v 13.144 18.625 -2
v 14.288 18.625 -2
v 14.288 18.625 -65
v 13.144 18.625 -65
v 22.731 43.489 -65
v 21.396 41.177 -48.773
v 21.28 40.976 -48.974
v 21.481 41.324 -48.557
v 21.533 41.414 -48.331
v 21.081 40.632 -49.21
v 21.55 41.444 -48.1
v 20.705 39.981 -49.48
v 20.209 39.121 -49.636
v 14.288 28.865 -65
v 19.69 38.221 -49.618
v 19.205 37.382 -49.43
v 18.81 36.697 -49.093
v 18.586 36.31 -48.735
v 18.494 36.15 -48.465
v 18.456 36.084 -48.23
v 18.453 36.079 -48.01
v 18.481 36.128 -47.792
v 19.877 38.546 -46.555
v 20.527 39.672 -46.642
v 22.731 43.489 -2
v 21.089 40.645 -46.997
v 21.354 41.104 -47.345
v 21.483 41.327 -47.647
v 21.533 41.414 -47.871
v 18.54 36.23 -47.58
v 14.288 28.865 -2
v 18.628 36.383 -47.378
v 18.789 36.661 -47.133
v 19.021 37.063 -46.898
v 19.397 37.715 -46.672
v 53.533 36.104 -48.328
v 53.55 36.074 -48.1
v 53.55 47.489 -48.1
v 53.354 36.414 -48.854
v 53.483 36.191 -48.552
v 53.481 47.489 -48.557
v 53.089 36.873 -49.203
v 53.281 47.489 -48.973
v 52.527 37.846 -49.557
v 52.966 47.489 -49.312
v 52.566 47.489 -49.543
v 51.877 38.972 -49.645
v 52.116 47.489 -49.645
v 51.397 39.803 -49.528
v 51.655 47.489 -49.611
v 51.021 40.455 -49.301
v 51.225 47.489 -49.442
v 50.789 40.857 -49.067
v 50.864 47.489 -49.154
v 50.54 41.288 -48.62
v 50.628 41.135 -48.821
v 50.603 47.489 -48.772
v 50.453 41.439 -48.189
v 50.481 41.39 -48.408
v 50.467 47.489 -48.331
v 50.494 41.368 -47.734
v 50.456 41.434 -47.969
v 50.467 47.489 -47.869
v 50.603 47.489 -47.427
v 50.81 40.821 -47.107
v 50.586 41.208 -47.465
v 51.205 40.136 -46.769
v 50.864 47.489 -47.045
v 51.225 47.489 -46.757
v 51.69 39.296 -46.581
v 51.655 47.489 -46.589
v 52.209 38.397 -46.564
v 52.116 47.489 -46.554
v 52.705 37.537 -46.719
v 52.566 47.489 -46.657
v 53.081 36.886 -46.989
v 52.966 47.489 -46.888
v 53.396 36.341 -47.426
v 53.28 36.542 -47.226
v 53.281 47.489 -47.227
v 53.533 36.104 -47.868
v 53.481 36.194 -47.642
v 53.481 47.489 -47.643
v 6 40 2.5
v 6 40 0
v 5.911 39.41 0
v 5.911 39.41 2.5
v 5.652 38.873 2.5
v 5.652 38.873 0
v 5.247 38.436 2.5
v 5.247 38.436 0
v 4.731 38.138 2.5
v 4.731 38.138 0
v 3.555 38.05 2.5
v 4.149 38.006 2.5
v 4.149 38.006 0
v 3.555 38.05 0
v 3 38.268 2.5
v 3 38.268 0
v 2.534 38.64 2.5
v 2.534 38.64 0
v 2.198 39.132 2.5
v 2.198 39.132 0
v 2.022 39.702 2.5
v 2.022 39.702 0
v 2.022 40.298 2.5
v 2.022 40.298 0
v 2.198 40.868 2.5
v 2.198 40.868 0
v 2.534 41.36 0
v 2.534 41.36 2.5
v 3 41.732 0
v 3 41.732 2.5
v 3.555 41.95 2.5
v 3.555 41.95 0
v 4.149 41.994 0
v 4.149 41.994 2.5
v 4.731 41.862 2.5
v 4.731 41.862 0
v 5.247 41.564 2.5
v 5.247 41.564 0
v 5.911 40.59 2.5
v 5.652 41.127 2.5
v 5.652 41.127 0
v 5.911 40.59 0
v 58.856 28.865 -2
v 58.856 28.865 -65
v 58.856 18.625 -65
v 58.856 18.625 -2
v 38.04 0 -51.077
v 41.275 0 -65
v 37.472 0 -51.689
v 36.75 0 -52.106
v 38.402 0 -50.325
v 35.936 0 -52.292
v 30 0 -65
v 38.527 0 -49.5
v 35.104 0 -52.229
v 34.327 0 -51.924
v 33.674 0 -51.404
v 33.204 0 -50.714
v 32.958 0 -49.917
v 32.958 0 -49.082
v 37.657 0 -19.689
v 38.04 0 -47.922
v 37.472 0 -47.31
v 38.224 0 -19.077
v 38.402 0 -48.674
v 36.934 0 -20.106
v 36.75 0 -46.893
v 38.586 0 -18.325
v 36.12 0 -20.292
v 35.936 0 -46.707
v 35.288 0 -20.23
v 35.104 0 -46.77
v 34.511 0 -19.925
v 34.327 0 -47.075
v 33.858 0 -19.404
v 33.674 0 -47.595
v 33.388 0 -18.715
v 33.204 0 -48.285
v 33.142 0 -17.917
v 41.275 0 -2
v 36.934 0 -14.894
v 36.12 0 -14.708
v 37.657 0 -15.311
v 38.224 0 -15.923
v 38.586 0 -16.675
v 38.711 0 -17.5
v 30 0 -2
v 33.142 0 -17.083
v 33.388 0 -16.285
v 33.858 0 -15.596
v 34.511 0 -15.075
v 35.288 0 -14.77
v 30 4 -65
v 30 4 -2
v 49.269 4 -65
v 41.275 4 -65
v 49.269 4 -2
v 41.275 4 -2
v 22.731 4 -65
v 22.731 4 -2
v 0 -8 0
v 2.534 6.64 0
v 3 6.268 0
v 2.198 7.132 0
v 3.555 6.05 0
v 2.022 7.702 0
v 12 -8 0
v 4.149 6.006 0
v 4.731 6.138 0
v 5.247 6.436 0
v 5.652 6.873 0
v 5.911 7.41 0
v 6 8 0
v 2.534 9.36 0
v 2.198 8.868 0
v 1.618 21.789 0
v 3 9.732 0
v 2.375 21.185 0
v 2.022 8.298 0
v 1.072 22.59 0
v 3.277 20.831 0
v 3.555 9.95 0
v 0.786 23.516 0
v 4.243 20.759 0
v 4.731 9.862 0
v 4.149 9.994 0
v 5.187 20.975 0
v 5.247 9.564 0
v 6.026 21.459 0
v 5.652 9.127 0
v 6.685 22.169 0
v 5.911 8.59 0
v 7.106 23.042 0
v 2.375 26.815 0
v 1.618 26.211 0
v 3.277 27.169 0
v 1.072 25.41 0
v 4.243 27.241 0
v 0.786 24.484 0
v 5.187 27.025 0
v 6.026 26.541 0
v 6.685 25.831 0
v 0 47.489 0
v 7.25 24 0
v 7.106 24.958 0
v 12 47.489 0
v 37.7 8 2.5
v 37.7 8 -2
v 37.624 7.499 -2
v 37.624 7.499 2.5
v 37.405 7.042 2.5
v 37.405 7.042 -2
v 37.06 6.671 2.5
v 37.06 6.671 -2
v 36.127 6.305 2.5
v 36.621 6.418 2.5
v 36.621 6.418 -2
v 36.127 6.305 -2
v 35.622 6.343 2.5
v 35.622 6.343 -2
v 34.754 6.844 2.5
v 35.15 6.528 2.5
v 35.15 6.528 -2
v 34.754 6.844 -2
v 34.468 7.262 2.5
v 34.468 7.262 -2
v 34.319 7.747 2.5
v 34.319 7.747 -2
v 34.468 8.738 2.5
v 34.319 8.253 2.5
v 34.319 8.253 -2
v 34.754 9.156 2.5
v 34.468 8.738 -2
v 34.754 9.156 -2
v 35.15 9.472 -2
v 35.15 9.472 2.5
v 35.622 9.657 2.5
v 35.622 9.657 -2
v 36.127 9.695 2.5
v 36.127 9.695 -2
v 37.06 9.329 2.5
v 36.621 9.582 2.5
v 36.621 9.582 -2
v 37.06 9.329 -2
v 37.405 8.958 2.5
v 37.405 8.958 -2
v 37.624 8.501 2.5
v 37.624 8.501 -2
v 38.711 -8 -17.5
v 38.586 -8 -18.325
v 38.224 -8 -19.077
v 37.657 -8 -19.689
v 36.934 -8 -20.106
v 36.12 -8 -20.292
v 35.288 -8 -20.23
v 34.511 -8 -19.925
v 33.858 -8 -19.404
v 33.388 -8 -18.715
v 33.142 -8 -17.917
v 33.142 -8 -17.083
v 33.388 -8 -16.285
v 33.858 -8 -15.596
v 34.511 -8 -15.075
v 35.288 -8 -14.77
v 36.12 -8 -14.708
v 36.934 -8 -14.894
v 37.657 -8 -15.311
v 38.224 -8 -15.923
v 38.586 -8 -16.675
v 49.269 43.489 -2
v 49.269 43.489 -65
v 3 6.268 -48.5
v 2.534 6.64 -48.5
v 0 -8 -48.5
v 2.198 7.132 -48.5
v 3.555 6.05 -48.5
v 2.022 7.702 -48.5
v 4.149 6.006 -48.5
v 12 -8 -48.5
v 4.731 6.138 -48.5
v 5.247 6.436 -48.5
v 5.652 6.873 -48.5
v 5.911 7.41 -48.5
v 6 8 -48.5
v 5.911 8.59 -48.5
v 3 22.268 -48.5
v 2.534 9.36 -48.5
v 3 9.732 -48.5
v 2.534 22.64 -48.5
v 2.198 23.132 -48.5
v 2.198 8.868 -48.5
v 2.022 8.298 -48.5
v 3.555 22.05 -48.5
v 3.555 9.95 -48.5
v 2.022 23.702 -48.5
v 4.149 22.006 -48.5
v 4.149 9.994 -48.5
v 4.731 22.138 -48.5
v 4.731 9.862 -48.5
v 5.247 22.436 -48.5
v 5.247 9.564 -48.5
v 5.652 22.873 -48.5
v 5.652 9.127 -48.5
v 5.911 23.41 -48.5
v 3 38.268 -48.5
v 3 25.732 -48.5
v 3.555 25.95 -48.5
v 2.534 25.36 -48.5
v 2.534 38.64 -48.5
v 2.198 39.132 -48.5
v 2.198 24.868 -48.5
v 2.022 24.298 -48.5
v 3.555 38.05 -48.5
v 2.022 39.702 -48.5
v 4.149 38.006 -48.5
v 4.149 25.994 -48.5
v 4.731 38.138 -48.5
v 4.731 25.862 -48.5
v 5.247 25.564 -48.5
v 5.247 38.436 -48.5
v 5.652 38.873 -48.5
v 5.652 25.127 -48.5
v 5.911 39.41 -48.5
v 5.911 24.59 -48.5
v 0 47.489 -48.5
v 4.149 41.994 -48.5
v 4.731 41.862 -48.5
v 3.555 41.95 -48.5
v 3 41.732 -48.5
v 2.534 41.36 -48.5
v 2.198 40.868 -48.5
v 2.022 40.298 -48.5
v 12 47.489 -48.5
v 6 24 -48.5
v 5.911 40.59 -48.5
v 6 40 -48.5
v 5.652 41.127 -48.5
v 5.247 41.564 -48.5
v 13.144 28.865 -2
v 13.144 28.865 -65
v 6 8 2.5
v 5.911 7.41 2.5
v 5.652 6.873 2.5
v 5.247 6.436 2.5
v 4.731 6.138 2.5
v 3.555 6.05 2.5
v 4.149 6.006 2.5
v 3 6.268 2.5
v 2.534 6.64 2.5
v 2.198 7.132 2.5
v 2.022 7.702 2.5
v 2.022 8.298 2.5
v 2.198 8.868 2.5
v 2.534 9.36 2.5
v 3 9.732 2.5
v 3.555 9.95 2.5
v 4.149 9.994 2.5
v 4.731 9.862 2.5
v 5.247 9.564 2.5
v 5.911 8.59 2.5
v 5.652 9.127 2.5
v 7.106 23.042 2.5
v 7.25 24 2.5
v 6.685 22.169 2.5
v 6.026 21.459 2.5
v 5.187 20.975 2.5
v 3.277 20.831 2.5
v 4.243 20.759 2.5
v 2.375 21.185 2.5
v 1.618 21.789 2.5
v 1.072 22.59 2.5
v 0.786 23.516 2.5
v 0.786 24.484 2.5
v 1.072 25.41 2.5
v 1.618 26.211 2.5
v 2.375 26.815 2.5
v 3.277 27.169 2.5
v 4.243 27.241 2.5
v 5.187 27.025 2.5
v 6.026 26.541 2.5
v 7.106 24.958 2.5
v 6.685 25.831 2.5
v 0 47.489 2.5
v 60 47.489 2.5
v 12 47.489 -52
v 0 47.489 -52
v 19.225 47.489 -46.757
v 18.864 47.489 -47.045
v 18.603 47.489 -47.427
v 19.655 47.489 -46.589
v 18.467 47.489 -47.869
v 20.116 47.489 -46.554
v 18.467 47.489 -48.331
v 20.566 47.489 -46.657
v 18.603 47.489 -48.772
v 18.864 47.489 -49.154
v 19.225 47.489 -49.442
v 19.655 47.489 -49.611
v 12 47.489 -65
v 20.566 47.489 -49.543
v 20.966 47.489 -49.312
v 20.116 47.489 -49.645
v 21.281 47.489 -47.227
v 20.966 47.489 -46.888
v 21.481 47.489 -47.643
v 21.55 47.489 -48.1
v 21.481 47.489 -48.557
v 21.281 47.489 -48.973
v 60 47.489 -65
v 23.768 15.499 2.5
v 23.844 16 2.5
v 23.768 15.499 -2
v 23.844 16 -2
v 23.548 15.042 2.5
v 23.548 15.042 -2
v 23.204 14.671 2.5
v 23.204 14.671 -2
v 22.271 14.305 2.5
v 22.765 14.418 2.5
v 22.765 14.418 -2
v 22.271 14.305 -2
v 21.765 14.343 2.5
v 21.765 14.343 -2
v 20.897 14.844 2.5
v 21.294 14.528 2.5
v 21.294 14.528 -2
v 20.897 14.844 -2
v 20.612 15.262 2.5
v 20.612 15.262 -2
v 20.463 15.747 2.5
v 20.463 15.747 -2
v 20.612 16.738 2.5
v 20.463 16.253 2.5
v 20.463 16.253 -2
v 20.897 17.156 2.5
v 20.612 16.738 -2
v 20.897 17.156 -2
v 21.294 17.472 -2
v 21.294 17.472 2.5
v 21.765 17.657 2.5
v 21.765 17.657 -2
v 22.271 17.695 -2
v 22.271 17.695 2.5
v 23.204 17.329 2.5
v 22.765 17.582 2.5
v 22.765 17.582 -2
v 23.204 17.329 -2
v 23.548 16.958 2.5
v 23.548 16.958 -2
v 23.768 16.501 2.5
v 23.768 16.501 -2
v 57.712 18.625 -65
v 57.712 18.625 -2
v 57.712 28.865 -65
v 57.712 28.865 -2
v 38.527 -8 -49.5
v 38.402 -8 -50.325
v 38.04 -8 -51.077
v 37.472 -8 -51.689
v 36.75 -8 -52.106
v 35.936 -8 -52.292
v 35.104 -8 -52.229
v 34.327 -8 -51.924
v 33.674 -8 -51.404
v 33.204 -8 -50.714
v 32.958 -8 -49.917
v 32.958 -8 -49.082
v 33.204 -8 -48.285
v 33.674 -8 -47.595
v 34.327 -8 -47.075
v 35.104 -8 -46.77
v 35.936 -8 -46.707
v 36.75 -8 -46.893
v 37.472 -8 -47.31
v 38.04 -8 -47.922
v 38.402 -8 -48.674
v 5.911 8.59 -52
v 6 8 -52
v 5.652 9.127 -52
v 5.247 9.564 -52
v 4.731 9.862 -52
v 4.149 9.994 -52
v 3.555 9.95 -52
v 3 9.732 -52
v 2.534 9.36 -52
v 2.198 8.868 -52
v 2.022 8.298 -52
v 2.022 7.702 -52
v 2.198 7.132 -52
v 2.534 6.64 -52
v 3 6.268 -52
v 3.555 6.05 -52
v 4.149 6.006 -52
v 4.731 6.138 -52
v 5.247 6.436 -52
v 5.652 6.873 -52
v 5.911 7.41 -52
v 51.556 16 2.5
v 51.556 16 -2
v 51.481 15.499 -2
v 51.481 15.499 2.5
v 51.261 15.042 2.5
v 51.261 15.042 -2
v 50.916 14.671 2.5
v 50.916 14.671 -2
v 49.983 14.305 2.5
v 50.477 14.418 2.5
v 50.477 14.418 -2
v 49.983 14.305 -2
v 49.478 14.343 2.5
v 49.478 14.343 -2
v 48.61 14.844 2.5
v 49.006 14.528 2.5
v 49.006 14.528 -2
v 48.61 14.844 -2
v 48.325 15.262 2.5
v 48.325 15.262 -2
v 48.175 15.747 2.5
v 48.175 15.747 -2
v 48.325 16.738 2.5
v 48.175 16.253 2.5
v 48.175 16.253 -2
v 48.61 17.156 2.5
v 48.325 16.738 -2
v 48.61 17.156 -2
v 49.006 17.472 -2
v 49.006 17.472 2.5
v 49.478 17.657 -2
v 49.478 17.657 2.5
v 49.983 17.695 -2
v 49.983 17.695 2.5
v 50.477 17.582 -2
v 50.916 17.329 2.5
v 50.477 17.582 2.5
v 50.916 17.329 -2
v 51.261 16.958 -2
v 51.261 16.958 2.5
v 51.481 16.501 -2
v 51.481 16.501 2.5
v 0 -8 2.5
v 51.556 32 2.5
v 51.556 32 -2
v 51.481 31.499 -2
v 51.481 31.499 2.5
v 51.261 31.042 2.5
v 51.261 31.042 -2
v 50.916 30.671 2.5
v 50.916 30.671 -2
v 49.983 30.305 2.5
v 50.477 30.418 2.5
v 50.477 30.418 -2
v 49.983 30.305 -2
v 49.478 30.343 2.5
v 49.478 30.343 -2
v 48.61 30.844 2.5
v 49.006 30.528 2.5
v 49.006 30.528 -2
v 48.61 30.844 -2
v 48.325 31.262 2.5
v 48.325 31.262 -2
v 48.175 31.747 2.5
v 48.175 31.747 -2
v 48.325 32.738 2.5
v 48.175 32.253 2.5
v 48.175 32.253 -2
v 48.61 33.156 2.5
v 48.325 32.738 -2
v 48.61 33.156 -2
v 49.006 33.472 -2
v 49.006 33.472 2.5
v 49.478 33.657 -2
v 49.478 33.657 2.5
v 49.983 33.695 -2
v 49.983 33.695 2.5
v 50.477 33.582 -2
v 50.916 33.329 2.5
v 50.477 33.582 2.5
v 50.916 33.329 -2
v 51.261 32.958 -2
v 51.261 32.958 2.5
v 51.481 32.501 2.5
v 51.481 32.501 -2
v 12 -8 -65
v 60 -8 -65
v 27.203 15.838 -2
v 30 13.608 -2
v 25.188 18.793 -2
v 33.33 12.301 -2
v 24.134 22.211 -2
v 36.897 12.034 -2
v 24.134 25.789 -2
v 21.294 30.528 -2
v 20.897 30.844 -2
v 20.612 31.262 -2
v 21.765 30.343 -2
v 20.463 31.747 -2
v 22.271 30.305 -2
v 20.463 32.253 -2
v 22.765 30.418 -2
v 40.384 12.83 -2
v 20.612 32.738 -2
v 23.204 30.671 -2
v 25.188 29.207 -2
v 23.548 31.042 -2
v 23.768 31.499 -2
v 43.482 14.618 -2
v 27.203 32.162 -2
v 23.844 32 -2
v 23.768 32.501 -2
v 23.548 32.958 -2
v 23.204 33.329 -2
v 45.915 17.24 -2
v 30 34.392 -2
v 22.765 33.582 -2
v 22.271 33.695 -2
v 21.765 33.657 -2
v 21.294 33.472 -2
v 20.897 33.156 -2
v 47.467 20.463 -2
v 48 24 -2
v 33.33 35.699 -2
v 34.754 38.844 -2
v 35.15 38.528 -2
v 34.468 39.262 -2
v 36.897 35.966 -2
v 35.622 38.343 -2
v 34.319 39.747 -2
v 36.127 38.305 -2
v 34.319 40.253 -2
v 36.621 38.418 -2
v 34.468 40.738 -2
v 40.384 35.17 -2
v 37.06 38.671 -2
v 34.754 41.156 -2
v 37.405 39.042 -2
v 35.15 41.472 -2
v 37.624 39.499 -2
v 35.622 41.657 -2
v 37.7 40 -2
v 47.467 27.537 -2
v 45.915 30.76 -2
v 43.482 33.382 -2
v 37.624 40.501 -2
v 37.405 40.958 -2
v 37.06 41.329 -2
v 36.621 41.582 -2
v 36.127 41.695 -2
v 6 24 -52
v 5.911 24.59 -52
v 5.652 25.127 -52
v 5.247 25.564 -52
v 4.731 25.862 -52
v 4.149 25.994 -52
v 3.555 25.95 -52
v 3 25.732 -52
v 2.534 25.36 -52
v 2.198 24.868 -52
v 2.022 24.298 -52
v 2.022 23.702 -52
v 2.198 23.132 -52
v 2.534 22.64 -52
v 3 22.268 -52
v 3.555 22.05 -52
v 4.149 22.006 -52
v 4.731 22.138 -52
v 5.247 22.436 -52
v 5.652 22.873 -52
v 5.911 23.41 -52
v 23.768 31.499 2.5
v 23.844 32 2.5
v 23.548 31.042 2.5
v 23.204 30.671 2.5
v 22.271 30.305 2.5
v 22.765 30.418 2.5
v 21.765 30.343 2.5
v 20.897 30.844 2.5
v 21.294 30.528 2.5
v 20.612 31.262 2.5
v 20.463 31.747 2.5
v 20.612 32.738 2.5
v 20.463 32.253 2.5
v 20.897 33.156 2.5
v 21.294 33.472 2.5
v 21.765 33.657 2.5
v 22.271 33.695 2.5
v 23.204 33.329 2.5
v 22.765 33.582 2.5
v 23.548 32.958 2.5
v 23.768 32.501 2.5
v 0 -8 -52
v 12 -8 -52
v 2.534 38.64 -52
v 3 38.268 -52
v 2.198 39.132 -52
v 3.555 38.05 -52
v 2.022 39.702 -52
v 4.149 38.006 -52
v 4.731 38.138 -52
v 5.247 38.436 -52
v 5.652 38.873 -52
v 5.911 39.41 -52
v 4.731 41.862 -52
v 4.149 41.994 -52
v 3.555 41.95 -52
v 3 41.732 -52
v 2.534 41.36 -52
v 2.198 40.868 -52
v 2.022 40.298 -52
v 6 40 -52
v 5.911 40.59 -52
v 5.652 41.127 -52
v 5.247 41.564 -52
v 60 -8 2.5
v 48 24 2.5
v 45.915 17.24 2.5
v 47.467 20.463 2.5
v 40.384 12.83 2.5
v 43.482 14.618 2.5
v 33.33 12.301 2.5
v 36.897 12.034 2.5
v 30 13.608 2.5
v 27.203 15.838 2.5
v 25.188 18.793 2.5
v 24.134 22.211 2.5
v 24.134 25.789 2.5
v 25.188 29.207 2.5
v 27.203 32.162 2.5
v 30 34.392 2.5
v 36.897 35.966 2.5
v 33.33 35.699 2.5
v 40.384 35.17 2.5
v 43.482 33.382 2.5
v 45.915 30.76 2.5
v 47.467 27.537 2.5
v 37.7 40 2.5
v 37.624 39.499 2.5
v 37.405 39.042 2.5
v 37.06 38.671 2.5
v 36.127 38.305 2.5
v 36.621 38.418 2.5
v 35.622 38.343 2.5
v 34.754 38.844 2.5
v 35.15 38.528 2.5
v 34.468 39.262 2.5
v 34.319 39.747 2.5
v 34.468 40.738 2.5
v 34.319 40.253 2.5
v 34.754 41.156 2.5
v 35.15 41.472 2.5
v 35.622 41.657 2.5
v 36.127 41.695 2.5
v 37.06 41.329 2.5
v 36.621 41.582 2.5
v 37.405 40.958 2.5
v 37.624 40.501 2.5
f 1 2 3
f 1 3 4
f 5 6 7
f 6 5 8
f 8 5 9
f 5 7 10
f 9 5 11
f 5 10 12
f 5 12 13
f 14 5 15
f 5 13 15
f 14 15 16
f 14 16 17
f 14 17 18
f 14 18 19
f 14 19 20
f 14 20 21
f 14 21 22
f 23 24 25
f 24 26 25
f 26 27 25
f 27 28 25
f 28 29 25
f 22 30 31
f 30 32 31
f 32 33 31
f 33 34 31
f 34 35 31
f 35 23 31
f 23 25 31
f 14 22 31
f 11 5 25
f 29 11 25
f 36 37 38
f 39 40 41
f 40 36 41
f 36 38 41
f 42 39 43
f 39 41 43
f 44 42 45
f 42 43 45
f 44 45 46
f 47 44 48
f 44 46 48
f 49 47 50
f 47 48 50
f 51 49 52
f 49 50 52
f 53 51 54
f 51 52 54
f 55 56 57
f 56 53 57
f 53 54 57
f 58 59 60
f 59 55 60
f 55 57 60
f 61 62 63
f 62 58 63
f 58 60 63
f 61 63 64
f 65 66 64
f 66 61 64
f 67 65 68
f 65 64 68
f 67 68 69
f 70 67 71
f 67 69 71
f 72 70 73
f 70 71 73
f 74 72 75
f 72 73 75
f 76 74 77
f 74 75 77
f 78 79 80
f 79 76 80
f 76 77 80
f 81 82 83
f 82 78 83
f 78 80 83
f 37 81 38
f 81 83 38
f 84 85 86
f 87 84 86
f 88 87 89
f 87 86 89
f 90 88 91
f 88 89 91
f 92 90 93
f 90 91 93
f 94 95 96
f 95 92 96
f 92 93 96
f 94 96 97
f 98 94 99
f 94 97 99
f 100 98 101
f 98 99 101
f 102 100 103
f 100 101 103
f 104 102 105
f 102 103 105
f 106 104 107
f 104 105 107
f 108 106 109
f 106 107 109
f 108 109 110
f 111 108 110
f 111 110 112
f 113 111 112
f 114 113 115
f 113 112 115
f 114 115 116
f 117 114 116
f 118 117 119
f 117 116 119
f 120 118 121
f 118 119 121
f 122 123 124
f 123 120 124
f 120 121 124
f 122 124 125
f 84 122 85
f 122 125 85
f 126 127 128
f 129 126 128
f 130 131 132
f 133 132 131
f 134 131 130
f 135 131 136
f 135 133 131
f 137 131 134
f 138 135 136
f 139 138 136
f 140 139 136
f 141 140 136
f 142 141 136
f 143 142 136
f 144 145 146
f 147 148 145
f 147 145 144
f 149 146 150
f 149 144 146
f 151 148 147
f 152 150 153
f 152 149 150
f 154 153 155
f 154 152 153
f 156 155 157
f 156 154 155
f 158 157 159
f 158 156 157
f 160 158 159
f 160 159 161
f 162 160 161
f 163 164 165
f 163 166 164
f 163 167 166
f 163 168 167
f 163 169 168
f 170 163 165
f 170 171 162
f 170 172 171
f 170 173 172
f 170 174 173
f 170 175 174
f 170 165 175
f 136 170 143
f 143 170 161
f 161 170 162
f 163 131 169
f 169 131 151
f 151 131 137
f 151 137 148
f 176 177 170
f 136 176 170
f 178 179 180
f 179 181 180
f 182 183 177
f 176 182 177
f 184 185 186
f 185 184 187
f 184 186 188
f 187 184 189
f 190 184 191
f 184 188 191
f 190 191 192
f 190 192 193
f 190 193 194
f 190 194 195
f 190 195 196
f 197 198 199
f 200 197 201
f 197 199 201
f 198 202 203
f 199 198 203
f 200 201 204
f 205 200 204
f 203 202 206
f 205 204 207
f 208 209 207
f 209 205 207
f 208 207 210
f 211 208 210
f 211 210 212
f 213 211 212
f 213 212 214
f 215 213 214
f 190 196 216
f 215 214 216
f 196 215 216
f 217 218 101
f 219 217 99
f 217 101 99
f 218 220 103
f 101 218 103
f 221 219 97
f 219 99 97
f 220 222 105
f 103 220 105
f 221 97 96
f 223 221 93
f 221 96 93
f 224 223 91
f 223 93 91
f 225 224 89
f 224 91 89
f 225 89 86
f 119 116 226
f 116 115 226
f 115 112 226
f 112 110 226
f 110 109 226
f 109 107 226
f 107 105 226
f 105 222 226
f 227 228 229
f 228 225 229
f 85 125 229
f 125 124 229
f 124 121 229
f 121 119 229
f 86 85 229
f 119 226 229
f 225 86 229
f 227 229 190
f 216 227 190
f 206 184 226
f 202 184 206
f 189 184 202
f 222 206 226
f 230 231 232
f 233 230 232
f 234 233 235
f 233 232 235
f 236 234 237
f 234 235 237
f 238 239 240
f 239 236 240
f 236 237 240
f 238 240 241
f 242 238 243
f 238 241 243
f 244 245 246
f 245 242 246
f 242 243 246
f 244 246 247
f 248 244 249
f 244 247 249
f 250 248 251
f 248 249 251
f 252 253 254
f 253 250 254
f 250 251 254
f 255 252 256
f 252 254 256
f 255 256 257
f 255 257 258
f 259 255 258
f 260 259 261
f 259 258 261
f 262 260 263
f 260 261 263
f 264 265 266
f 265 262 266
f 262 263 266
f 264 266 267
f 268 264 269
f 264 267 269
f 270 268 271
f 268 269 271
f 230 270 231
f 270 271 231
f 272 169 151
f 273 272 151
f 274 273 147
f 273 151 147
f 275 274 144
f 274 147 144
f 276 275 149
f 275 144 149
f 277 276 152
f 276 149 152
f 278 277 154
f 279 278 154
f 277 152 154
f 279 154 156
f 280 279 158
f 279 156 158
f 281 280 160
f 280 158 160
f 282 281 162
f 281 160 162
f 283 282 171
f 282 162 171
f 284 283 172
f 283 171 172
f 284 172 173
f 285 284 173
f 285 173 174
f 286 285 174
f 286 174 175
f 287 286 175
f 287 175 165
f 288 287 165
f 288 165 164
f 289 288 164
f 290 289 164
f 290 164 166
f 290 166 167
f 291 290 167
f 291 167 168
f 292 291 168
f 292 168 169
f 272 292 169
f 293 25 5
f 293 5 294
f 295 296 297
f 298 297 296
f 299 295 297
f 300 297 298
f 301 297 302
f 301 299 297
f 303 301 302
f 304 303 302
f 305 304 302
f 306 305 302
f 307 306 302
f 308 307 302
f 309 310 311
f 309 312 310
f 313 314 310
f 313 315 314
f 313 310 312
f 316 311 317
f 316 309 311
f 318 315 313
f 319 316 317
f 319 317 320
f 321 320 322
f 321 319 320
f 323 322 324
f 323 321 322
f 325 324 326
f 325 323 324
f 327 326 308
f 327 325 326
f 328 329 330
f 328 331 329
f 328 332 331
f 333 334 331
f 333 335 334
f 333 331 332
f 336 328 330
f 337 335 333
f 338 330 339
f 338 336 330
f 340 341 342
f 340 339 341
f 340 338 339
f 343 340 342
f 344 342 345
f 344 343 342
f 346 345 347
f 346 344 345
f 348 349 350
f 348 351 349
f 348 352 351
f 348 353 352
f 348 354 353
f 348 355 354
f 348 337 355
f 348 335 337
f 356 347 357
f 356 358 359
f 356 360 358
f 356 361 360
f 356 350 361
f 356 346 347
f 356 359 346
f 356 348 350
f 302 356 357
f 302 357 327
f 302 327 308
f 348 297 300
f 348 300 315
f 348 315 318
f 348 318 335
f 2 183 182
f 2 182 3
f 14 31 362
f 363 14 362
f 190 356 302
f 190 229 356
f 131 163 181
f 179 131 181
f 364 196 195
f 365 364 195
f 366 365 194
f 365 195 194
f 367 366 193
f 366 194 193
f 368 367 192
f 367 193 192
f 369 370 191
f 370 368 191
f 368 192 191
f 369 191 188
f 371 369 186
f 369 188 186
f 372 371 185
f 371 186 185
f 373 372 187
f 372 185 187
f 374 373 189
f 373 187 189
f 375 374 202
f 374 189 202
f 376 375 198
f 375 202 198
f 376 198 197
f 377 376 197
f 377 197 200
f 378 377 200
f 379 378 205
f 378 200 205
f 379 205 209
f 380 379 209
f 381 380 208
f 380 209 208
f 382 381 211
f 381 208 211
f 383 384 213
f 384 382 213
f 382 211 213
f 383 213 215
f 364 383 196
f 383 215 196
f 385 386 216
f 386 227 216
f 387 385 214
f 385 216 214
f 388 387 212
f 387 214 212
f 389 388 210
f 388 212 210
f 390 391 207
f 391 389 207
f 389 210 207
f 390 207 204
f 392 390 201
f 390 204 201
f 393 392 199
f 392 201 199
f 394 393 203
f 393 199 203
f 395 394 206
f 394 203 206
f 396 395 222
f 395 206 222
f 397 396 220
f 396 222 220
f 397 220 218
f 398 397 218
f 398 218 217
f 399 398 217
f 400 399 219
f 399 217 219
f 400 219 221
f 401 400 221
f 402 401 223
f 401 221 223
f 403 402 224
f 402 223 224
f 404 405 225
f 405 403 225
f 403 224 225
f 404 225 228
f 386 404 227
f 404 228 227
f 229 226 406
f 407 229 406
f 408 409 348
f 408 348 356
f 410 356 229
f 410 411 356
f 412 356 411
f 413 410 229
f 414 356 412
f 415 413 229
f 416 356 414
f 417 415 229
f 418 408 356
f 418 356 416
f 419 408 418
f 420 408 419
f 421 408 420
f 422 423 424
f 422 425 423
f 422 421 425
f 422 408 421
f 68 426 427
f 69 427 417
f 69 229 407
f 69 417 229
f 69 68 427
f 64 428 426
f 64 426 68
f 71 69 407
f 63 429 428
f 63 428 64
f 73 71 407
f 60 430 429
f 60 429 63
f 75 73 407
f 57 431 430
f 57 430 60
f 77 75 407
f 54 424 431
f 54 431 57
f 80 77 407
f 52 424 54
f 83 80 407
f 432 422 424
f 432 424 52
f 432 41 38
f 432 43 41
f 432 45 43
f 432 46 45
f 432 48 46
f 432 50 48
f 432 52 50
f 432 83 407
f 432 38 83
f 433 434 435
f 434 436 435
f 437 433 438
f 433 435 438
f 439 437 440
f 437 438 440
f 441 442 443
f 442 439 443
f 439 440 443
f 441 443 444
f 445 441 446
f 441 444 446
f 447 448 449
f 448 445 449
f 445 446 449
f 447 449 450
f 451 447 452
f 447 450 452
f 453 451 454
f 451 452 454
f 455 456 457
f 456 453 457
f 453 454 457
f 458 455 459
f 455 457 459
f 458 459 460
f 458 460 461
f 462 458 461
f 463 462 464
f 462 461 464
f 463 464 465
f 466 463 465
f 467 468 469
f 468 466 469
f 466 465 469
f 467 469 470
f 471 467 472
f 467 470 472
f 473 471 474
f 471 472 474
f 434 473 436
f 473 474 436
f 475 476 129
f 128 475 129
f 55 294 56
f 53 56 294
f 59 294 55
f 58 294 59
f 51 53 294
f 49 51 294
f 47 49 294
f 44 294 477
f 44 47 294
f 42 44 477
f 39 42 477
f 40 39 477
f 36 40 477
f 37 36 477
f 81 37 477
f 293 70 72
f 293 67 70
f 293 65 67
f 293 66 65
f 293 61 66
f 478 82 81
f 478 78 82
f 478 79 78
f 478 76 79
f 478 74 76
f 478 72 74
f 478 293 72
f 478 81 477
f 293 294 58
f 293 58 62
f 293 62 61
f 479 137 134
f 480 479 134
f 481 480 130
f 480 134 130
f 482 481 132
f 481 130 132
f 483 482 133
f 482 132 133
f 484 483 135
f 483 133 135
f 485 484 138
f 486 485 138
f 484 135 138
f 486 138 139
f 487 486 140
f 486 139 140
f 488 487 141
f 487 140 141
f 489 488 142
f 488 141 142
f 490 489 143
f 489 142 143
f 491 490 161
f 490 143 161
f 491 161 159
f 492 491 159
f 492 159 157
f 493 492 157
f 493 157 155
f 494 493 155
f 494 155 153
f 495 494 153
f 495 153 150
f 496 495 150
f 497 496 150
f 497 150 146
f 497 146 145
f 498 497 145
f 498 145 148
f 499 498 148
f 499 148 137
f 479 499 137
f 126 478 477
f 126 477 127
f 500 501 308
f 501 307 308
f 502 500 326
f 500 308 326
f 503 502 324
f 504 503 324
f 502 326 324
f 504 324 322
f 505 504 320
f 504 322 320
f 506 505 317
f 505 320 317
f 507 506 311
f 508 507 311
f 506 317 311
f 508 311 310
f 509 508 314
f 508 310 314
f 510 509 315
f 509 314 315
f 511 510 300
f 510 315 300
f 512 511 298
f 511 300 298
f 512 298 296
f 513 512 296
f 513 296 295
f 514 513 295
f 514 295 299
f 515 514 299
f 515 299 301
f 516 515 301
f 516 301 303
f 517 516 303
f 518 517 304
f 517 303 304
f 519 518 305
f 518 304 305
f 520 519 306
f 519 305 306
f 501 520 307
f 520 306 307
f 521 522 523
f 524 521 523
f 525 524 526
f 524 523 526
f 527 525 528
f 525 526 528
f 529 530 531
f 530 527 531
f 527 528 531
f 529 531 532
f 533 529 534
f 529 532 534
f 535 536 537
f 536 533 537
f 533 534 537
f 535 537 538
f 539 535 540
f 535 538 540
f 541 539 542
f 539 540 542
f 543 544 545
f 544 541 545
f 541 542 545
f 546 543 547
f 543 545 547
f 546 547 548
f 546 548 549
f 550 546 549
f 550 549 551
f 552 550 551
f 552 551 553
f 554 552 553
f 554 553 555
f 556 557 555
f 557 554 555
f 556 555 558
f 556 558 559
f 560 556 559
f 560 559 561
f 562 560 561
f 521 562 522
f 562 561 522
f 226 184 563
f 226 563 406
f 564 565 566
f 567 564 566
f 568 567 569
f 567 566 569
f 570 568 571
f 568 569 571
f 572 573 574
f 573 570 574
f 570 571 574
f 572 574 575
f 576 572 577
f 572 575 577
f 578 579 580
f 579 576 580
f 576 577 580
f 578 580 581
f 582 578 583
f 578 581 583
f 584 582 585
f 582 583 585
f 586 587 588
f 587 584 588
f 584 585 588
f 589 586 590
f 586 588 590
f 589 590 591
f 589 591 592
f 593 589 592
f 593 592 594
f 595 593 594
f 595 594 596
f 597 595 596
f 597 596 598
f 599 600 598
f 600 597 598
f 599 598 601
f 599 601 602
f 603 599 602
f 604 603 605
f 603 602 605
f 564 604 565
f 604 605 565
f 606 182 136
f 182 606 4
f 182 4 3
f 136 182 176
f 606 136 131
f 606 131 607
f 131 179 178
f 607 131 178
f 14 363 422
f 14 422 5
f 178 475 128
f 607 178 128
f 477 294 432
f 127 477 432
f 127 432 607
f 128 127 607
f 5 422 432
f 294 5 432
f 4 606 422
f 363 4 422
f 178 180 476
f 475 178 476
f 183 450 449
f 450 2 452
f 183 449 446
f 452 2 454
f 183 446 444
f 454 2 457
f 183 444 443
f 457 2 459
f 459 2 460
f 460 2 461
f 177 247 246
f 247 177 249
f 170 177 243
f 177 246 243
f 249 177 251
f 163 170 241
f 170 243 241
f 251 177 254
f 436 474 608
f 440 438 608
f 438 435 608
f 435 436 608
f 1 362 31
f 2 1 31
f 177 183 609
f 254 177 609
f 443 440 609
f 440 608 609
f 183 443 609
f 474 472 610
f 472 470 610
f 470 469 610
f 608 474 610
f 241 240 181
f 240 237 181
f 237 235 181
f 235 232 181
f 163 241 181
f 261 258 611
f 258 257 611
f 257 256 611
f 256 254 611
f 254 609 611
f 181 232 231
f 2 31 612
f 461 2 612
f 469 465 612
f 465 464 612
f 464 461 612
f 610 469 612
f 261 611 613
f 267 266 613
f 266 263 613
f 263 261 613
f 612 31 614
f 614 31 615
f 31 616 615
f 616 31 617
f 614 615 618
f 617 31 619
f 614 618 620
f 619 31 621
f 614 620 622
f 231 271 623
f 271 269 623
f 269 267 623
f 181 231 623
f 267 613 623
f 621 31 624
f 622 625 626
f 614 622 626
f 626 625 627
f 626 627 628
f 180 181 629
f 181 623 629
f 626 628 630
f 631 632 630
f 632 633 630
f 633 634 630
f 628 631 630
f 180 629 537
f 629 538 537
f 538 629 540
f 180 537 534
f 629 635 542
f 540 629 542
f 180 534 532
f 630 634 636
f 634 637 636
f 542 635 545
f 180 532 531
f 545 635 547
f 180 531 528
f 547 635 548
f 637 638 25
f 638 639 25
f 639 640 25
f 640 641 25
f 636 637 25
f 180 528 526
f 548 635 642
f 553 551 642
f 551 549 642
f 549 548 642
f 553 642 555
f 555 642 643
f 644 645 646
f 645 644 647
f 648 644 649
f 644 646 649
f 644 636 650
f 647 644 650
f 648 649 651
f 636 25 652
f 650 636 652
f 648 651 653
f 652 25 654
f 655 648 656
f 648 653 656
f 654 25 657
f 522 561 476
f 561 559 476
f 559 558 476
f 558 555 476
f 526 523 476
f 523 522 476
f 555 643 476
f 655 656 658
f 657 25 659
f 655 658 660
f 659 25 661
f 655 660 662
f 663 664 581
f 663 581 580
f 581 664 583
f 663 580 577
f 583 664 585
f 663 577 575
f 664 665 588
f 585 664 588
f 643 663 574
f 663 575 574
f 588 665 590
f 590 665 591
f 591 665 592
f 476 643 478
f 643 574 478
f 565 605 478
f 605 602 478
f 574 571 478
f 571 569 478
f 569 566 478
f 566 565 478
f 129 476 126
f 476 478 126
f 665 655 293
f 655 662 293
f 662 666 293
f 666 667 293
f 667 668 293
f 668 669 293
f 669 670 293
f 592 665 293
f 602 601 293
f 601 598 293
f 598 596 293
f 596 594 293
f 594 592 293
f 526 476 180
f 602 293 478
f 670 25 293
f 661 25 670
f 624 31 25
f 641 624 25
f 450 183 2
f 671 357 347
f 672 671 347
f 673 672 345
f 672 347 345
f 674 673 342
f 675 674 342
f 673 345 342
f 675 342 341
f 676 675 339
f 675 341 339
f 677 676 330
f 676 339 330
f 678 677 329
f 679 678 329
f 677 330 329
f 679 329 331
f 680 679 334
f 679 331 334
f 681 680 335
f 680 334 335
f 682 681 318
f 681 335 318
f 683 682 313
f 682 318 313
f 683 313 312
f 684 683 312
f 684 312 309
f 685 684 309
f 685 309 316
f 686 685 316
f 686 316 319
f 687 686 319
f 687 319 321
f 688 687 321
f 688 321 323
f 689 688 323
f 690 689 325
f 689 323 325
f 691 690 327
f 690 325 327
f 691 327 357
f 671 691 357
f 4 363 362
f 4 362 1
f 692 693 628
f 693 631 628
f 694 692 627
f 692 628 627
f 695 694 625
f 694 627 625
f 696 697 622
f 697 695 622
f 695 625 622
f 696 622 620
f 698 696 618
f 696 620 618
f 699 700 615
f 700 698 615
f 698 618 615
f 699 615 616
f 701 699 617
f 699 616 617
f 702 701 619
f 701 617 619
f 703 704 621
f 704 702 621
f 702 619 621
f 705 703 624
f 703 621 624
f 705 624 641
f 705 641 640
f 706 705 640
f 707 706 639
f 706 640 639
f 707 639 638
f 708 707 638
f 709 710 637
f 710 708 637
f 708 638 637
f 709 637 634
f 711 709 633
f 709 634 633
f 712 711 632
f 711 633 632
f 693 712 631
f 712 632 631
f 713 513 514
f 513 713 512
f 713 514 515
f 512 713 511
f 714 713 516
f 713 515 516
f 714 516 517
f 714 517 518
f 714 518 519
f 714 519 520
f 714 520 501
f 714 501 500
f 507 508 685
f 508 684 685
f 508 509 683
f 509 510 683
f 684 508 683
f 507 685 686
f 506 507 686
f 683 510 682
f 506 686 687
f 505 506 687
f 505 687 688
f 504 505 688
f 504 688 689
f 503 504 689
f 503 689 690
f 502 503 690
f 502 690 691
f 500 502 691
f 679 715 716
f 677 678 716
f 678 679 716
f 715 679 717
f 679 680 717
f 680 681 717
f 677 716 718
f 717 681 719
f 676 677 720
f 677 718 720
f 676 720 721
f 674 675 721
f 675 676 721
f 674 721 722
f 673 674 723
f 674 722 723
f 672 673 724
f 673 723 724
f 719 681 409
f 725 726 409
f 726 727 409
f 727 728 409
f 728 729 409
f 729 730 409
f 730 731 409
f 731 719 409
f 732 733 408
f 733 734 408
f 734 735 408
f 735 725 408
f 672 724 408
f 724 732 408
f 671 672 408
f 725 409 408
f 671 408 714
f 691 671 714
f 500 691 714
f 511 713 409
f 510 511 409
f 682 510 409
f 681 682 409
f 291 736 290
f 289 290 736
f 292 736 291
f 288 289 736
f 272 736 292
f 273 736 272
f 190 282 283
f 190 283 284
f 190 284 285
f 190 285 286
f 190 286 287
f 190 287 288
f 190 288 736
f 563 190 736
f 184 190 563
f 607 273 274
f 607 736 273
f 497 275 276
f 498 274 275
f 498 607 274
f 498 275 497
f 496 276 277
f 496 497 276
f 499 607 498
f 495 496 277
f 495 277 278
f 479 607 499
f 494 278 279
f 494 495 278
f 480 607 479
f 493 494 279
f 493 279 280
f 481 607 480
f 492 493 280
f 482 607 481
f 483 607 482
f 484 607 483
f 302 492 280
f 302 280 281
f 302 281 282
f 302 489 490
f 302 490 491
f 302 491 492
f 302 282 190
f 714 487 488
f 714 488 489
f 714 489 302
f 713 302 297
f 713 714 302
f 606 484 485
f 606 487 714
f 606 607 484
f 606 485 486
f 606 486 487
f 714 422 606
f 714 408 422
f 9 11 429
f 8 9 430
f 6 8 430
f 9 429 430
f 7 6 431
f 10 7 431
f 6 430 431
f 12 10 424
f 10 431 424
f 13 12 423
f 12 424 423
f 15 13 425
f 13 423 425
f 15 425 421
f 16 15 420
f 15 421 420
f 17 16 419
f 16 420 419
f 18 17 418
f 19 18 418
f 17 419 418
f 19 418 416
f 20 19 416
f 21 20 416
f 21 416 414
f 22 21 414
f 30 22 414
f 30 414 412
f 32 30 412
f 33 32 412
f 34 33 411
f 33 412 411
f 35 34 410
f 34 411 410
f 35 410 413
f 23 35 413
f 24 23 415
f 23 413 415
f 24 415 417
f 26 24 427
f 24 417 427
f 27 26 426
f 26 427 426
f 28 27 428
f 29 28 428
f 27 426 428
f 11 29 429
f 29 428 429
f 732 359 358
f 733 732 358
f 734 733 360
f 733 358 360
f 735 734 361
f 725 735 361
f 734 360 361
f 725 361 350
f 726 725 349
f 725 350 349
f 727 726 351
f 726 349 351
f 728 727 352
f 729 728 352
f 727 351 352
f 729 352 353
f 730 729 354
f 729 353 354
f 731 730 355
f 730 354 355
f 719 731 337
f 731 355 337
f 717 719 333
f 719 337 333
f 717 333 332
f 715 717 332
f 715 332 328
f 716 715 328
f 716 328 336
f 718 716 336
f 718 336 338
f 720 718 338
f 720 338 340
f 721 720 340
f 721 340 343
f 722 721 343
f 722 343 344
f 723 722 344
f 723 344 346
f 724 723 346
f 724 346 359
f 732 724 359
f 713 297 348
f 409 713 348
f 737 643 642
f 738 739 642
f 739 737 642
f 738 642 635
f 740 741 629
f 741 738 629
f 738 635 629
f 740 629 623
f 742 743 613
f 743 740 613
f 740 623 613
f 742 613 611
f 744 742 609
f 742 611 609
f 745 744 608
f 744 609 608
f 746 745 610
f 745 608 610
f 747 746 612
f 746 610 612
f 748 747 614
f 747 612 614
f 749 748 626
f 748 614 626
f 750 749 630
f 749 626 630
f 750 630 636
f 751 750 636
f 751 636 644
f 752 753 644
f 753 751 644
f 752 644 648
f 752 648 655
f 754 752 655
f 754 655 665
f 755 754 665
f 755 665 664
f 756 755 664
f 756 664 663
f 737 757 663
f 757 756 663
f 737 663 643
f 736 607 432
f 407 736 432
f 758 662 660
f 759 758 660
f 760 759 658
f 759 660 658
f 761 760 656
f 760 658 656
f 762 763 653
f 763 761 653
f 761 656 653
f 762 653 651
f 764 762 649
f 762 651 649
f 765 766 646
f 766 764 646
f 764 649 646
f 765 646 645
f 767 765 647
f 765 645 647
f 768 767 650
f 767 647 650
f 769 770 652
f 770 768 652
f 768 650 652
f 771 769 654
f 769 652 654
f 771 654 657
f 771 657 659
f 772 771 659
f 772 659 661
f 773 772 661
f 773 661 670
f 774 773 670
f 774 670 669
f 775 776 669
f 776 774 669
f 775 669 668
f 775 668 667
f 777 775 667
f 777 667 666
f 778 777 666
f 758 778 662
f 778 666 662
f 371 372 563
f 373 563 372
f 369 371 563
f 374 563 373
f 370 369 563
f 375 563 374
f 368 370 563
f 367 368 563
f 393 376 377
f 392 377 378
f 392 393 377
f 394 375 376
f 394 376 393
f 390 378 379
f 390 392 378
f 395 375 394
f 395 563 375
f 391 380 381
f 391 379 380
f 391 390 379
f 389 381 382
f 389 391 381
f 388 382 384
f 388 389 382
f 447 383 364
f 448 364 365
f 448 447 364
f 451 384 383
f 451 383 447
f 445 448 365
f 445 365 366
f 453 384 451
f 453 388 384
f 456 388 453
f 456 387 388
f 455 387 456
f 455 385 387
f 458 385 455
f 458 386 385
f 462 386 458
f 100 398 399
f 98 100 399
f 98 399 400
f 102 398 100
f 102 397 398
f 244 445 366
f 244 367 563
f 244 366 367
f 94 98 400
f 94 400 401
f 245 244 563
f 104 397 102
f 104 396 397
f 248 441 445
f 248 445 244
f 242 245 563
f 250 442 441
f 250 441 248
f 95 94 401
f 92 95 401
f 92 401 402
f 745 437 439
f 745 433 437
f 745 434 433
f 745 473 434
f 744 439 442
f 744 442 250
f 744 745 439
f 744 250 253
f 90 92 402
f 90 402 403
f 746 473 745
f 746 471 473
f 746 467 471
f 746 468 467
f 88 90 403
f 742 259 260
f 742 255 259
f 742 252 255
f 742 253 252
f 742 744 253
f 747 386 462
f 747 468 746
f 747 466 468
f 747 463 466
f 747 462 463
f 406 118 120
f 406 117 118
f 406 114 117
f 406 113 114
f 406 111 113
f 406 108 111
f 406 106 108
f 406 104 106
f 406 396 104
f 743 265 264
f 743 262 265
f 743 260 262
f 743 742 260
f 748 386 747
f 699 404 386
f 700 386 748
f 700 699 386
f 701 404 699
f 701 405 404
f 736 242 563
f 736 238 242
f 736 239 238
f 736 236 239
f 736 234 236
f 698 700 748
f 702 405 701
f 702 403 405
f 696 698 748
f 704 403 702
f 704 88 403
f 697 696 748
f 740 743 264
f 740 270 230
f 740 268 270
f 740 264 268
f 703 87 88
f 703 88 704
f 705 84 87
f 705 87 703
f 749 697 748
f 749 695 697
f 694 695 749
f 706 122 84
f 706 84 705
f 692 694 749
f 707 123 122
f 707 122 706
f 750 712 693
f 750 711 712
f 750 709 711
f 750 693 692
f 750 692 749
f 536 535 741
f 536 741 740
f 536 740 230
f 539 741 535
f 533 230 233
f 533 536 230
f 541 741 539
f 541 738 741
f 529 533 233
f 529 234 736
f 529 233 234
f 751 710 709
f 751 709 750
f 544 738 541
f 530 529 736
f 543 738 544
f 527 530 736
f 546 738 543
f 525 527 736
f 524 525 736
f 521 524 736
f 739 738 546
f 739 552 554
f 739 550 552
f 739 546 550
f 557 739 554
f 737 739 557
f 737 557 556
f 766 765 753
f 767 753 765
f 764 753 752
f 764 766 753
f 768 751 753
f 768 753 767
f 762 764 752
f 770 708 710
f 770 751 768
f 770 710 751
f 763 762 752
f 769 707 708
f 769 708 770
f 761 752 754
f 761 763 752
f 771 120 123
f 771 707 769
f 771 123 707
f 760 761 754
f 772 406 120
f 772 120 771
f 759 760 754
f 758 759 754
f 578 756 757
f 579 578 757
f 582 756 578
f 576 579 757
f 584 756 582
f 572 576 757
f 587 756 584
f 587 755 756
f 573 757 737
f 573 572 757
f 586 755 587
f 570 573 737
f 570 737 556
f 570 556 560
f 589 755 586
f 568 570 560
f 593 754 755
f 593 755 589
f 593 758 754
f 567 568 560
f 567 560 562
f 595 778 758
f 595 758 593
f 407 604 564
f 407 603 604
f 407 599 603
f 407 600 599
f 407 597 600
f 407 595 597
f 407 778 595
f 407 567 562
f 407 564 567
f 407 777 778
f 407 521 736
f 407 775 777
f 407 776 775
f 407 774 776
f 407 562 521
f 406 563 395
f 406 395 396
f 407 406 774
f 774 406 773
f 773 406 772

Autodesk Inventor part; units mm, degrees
ref_plane "YZ Plane" through (0, 0, 0) normal (1, 0, 0) x (0, 1, 0)
sketch "Sketch1" plane through (0, 0, 0) normal (0, 0, 1) x (1, 0, 0)
  circle A0 centre (36, 40) radius 1.7
  line L0 (0, 0) -> (12, 0)
  line L1 (0, 0) -> (0, 384)
  line L2 (12, 384) -> (12, -8)
  circle A1 centre (4, 8) radius 2
  circle A2 centre (36, 24) radius 12
  line L3 (0, 0) -> (60, 0)
  line L4 (60, 0) -> (60, 47.4892)
  line L5 (60, 46) -> (0, 46)
  line L6 (0, 46) -> (0, 0)
  line L7 (0, 4) -> (60, 4)
  circle A3 centre (22.1436, 32) radius 1.7
  circle A4 centre (22.1436, 16) radius 1.7
  circle A5 centre (36, 8) radius 1.7
  circle A6 centre (49.8564, 16) radius 1.7
  circle A7 centre (49.8564, 32) radius 1.7
  circle A8 centre (4, 16) radius 2
  circle A9 centre (4, 24) radius 2
  circle A10 centre (4, 32) radius 2
  circle A11 centre (4, 40) radius 2
  line L8 (22.731, 4) -> (14.2875, 18.6246)
  line L9 (14.2875, 18.6246) -> (12, 18.6246)
  line L10 (36, 0) -> (36, 40) construction
  line L11 (49.269, 4) -> (57.7125, 18.6246)
  line L12 (57.7125, 18.6246) -> (60, 18.6246)
  line L13 (60, 23.7446) -> (12, 23.7446) construction
  line L14 (0, 47.4892) -> (60, 47.4892)
  line L15 (22.731, 43.4892) -> (14.2875, 28.8646)
  line L16 (14.2875, 28.8646) -> (12, 28.8646)
  line L17 (57.7125, 28.8646) -> (60, 28.8646)
  line L18 (49.269, 43.4892) -> (57.7125, 28.8646)
  line L19 (0, 43.4892) -> (12, 43.4892)
  line L20 (22.731, 43.4892) -> (49.269, 43.4892)
  line L21 (60, 28.8646) -> (58.8562, 28.8646)
  line L22 (58.8562, 28.8646) -> (58.8562, 18.6246)
  line L23 (58.8562, 18.6246) -> (60, 18.6246)
  line L24 (60, 18.6246) -> (60, 28.8646)
  line L25 (13.1437, 28.8646) -> (13.1437, 18.6246)
  circle A12 centre (4, 24) radius 3.25
  line L26 (0, 0) -> (60, 0)
  line L27 (60, 0) -> (60, -8)
  line L28 (60, -8) -> (0, -8)
  line L29 (0, -8) -> (0, 0)
  line L30 (0, -4) -> (60, -4)
  circle A13 centre (4, 0) radius 2
  line L31 (41.275, 0) -> (30, 0)
  line L32 (30, 4) -> (30, -4)
  line L33 (30, -4) -> (41.275, -4)
  line L34 (41.275, -4) -> (41.275, 4)
  circle A14 centre (4, 16) radius 3.25
  point P0 (12, 46)
  point P1 (12, 0)
  point P2 (12, 4)
  point P3 (0, 47.4892)
  point P4 (60, 43.4892)
  point P5 (12, 47.4892)
  point P6 (2, 0)
  point P7 (6, 0)
  dimension "d1" = 3.4
  dimension "d2" = 24
  dimension "d7" = 4
  dimension "d8" = 46
  dimension "d9" = 24
  dimension "d10" = 16
  dimension "d13" = 360
  dimension "d15" = 8
  dimension "d16" = 4
  dimension "d17" = 8
  dimension "d20" = 8
  dimension "d34" = 6.5
  dimension "d35" = 8
  dimension "d36" = 4
  dimension "d39" = 6.5
extrude "Extrusion1" add sketch "Sketch1" along normal blind 2.5 contours A13 L0 L1 L7 L2 | A13 L0 | L0 A13 | L0 L2 L30 L29 A13 | L3 L32 L30 L2 | L2 L7 L32 L3 | L7 L1 L19 L2 | L2 L9 L8 L7 | L30 L27 L28 L2 | L2 L28 L29 L30 | L32 L7 L34 L3 | L3 L34 L30 L32 | L2 L16 L25 L9 | L8 L9 L25 L16 L15 L20 L18 L17 L22 L12 L11 L7 | L34 L7 L4 L3 | L3 L27 L30 L34 | L2 L5 L4 L17 L18 L20 L15 L16 | L1 L5 L2 L19 | L1 L14 L2 L5 | L7 L11 L12 L4 | L2 L14 L4 L5 | L12 L22 L17 L4 | A8 | A10 | A14
extrude "Extrusion2" add sketch "Sketch1" against normal blind 2 contours L3 L32 L30 L2 | L2 L7 L32 L3 | L2 L9 L8 L7 | L30 L27 L28 L2 | L32 L7 L34 L3 | L3 L34 L30 L32 | L2 L16 L25 L9 | L8 L9 L25 L16 L15 L20 L18 L17 L22 L12 L11 L7 | L34 L7 L4 L3 | L3 L27 L30 L34 | L2 L5 L4 L17 L18 L20 L15 L16 | L7 L11 L12 L4 | L2 L14 L4 L5 | L12 L22 L17 L4
extrude "Extrusion3" add sketch "Sketch1" against normal blind 65 contours L3 L32 L30 L2 | L2 L7 L32 L3 | L2 L9 L8 L7 | L30 L27 L28 L2 | L3 L34 L30 L32 | L2 L16 L25 L9 | L34 L7 L4 L3 | L3 L27 L30 L34 | L2 L5 L4 L17 L18 L20 L15 L16 | L7 L11 L12 L4 | L2 L14 L4 L5 | L12 L22 L17 L4
sketch "Sketch2" plane through (22.731, 4, -2) normal (0, 1, 0) x (1, 0, 0)
  line L0 (26.5379, 0) -> (0, 0) construction
  line L1 (13.269, 0) -> (12.9065, 63) construction
  line L2 (7.269, 63) -> (18.544, 63) construction
  circle A0 centre (13.1798, 15.5) radius 2.8
  circle A1 centre (12.9957, 47.4995) radius 2.8
  circle A2 centre (29.269, 46.0997) radius 1.55
  circle A3 centre (-2.731, 46.0997) radius 1.55
  point P0 (-22.731, -2)
  point P1 (37.269, 50)
  point P2 (-10.731, 50)
  dimension "d27" = 5.6
  dimension "d28" = 5.6
  dimension "d29" = 32
  dimension "d30" = 63
  dimension "d31" = 15.5
  dimension "d40" = 3.1
  dimension "d41" = 3.1
extrude "Extrusion5" cut sketch "Sketch2" against normal blind 52 contours A0 | A1
extrude "Extrusion6" cut sketch "Sketch2" against normal blind 12 from surface at 43.4892 contours A2 | A3
ref_plane "Work Plane1" through (0, -8, -48) normal (0, 0, -1) x (0, 1, 0)
extrude "Extrusion7" add sketch "Sketch1" against normal blind 4 from surface at -48 contours A13 L0 L1 L7 L2 | A13 L0 | L0 A13 | L0 L2 L30 L29 A13 | L7 L1 L19 L2 | L2 L28 L29 L30 | L1 L5 L2 L19 | L1 L14 L2 L5 | A8 | A10 | A12 | A14
ref_plane "Work Plane2" through (0, -8, -48) normal (0, 0, -1) x (0, 1, 0)
extrude "Extrusion8" cut sketch "Sketch1" against normal blind 0.5 from surface at -48 contours A13 L0 L1 L7 L2 | A13 L0 | L0 A13 | L0 L2 L30 L29 A13 | L7 L1 L19 L2 | L2 L28 L29 L30 | L1 L5 L2 L19 | L1 L14 L2 L5 | A8 | A10 | A12 | A14
equation "\"d31\" = -0.5 * d29 + 0.5 * d30"
equation "\"d41\" = d40"
properties part number "ViperSlide Motor Mount"
